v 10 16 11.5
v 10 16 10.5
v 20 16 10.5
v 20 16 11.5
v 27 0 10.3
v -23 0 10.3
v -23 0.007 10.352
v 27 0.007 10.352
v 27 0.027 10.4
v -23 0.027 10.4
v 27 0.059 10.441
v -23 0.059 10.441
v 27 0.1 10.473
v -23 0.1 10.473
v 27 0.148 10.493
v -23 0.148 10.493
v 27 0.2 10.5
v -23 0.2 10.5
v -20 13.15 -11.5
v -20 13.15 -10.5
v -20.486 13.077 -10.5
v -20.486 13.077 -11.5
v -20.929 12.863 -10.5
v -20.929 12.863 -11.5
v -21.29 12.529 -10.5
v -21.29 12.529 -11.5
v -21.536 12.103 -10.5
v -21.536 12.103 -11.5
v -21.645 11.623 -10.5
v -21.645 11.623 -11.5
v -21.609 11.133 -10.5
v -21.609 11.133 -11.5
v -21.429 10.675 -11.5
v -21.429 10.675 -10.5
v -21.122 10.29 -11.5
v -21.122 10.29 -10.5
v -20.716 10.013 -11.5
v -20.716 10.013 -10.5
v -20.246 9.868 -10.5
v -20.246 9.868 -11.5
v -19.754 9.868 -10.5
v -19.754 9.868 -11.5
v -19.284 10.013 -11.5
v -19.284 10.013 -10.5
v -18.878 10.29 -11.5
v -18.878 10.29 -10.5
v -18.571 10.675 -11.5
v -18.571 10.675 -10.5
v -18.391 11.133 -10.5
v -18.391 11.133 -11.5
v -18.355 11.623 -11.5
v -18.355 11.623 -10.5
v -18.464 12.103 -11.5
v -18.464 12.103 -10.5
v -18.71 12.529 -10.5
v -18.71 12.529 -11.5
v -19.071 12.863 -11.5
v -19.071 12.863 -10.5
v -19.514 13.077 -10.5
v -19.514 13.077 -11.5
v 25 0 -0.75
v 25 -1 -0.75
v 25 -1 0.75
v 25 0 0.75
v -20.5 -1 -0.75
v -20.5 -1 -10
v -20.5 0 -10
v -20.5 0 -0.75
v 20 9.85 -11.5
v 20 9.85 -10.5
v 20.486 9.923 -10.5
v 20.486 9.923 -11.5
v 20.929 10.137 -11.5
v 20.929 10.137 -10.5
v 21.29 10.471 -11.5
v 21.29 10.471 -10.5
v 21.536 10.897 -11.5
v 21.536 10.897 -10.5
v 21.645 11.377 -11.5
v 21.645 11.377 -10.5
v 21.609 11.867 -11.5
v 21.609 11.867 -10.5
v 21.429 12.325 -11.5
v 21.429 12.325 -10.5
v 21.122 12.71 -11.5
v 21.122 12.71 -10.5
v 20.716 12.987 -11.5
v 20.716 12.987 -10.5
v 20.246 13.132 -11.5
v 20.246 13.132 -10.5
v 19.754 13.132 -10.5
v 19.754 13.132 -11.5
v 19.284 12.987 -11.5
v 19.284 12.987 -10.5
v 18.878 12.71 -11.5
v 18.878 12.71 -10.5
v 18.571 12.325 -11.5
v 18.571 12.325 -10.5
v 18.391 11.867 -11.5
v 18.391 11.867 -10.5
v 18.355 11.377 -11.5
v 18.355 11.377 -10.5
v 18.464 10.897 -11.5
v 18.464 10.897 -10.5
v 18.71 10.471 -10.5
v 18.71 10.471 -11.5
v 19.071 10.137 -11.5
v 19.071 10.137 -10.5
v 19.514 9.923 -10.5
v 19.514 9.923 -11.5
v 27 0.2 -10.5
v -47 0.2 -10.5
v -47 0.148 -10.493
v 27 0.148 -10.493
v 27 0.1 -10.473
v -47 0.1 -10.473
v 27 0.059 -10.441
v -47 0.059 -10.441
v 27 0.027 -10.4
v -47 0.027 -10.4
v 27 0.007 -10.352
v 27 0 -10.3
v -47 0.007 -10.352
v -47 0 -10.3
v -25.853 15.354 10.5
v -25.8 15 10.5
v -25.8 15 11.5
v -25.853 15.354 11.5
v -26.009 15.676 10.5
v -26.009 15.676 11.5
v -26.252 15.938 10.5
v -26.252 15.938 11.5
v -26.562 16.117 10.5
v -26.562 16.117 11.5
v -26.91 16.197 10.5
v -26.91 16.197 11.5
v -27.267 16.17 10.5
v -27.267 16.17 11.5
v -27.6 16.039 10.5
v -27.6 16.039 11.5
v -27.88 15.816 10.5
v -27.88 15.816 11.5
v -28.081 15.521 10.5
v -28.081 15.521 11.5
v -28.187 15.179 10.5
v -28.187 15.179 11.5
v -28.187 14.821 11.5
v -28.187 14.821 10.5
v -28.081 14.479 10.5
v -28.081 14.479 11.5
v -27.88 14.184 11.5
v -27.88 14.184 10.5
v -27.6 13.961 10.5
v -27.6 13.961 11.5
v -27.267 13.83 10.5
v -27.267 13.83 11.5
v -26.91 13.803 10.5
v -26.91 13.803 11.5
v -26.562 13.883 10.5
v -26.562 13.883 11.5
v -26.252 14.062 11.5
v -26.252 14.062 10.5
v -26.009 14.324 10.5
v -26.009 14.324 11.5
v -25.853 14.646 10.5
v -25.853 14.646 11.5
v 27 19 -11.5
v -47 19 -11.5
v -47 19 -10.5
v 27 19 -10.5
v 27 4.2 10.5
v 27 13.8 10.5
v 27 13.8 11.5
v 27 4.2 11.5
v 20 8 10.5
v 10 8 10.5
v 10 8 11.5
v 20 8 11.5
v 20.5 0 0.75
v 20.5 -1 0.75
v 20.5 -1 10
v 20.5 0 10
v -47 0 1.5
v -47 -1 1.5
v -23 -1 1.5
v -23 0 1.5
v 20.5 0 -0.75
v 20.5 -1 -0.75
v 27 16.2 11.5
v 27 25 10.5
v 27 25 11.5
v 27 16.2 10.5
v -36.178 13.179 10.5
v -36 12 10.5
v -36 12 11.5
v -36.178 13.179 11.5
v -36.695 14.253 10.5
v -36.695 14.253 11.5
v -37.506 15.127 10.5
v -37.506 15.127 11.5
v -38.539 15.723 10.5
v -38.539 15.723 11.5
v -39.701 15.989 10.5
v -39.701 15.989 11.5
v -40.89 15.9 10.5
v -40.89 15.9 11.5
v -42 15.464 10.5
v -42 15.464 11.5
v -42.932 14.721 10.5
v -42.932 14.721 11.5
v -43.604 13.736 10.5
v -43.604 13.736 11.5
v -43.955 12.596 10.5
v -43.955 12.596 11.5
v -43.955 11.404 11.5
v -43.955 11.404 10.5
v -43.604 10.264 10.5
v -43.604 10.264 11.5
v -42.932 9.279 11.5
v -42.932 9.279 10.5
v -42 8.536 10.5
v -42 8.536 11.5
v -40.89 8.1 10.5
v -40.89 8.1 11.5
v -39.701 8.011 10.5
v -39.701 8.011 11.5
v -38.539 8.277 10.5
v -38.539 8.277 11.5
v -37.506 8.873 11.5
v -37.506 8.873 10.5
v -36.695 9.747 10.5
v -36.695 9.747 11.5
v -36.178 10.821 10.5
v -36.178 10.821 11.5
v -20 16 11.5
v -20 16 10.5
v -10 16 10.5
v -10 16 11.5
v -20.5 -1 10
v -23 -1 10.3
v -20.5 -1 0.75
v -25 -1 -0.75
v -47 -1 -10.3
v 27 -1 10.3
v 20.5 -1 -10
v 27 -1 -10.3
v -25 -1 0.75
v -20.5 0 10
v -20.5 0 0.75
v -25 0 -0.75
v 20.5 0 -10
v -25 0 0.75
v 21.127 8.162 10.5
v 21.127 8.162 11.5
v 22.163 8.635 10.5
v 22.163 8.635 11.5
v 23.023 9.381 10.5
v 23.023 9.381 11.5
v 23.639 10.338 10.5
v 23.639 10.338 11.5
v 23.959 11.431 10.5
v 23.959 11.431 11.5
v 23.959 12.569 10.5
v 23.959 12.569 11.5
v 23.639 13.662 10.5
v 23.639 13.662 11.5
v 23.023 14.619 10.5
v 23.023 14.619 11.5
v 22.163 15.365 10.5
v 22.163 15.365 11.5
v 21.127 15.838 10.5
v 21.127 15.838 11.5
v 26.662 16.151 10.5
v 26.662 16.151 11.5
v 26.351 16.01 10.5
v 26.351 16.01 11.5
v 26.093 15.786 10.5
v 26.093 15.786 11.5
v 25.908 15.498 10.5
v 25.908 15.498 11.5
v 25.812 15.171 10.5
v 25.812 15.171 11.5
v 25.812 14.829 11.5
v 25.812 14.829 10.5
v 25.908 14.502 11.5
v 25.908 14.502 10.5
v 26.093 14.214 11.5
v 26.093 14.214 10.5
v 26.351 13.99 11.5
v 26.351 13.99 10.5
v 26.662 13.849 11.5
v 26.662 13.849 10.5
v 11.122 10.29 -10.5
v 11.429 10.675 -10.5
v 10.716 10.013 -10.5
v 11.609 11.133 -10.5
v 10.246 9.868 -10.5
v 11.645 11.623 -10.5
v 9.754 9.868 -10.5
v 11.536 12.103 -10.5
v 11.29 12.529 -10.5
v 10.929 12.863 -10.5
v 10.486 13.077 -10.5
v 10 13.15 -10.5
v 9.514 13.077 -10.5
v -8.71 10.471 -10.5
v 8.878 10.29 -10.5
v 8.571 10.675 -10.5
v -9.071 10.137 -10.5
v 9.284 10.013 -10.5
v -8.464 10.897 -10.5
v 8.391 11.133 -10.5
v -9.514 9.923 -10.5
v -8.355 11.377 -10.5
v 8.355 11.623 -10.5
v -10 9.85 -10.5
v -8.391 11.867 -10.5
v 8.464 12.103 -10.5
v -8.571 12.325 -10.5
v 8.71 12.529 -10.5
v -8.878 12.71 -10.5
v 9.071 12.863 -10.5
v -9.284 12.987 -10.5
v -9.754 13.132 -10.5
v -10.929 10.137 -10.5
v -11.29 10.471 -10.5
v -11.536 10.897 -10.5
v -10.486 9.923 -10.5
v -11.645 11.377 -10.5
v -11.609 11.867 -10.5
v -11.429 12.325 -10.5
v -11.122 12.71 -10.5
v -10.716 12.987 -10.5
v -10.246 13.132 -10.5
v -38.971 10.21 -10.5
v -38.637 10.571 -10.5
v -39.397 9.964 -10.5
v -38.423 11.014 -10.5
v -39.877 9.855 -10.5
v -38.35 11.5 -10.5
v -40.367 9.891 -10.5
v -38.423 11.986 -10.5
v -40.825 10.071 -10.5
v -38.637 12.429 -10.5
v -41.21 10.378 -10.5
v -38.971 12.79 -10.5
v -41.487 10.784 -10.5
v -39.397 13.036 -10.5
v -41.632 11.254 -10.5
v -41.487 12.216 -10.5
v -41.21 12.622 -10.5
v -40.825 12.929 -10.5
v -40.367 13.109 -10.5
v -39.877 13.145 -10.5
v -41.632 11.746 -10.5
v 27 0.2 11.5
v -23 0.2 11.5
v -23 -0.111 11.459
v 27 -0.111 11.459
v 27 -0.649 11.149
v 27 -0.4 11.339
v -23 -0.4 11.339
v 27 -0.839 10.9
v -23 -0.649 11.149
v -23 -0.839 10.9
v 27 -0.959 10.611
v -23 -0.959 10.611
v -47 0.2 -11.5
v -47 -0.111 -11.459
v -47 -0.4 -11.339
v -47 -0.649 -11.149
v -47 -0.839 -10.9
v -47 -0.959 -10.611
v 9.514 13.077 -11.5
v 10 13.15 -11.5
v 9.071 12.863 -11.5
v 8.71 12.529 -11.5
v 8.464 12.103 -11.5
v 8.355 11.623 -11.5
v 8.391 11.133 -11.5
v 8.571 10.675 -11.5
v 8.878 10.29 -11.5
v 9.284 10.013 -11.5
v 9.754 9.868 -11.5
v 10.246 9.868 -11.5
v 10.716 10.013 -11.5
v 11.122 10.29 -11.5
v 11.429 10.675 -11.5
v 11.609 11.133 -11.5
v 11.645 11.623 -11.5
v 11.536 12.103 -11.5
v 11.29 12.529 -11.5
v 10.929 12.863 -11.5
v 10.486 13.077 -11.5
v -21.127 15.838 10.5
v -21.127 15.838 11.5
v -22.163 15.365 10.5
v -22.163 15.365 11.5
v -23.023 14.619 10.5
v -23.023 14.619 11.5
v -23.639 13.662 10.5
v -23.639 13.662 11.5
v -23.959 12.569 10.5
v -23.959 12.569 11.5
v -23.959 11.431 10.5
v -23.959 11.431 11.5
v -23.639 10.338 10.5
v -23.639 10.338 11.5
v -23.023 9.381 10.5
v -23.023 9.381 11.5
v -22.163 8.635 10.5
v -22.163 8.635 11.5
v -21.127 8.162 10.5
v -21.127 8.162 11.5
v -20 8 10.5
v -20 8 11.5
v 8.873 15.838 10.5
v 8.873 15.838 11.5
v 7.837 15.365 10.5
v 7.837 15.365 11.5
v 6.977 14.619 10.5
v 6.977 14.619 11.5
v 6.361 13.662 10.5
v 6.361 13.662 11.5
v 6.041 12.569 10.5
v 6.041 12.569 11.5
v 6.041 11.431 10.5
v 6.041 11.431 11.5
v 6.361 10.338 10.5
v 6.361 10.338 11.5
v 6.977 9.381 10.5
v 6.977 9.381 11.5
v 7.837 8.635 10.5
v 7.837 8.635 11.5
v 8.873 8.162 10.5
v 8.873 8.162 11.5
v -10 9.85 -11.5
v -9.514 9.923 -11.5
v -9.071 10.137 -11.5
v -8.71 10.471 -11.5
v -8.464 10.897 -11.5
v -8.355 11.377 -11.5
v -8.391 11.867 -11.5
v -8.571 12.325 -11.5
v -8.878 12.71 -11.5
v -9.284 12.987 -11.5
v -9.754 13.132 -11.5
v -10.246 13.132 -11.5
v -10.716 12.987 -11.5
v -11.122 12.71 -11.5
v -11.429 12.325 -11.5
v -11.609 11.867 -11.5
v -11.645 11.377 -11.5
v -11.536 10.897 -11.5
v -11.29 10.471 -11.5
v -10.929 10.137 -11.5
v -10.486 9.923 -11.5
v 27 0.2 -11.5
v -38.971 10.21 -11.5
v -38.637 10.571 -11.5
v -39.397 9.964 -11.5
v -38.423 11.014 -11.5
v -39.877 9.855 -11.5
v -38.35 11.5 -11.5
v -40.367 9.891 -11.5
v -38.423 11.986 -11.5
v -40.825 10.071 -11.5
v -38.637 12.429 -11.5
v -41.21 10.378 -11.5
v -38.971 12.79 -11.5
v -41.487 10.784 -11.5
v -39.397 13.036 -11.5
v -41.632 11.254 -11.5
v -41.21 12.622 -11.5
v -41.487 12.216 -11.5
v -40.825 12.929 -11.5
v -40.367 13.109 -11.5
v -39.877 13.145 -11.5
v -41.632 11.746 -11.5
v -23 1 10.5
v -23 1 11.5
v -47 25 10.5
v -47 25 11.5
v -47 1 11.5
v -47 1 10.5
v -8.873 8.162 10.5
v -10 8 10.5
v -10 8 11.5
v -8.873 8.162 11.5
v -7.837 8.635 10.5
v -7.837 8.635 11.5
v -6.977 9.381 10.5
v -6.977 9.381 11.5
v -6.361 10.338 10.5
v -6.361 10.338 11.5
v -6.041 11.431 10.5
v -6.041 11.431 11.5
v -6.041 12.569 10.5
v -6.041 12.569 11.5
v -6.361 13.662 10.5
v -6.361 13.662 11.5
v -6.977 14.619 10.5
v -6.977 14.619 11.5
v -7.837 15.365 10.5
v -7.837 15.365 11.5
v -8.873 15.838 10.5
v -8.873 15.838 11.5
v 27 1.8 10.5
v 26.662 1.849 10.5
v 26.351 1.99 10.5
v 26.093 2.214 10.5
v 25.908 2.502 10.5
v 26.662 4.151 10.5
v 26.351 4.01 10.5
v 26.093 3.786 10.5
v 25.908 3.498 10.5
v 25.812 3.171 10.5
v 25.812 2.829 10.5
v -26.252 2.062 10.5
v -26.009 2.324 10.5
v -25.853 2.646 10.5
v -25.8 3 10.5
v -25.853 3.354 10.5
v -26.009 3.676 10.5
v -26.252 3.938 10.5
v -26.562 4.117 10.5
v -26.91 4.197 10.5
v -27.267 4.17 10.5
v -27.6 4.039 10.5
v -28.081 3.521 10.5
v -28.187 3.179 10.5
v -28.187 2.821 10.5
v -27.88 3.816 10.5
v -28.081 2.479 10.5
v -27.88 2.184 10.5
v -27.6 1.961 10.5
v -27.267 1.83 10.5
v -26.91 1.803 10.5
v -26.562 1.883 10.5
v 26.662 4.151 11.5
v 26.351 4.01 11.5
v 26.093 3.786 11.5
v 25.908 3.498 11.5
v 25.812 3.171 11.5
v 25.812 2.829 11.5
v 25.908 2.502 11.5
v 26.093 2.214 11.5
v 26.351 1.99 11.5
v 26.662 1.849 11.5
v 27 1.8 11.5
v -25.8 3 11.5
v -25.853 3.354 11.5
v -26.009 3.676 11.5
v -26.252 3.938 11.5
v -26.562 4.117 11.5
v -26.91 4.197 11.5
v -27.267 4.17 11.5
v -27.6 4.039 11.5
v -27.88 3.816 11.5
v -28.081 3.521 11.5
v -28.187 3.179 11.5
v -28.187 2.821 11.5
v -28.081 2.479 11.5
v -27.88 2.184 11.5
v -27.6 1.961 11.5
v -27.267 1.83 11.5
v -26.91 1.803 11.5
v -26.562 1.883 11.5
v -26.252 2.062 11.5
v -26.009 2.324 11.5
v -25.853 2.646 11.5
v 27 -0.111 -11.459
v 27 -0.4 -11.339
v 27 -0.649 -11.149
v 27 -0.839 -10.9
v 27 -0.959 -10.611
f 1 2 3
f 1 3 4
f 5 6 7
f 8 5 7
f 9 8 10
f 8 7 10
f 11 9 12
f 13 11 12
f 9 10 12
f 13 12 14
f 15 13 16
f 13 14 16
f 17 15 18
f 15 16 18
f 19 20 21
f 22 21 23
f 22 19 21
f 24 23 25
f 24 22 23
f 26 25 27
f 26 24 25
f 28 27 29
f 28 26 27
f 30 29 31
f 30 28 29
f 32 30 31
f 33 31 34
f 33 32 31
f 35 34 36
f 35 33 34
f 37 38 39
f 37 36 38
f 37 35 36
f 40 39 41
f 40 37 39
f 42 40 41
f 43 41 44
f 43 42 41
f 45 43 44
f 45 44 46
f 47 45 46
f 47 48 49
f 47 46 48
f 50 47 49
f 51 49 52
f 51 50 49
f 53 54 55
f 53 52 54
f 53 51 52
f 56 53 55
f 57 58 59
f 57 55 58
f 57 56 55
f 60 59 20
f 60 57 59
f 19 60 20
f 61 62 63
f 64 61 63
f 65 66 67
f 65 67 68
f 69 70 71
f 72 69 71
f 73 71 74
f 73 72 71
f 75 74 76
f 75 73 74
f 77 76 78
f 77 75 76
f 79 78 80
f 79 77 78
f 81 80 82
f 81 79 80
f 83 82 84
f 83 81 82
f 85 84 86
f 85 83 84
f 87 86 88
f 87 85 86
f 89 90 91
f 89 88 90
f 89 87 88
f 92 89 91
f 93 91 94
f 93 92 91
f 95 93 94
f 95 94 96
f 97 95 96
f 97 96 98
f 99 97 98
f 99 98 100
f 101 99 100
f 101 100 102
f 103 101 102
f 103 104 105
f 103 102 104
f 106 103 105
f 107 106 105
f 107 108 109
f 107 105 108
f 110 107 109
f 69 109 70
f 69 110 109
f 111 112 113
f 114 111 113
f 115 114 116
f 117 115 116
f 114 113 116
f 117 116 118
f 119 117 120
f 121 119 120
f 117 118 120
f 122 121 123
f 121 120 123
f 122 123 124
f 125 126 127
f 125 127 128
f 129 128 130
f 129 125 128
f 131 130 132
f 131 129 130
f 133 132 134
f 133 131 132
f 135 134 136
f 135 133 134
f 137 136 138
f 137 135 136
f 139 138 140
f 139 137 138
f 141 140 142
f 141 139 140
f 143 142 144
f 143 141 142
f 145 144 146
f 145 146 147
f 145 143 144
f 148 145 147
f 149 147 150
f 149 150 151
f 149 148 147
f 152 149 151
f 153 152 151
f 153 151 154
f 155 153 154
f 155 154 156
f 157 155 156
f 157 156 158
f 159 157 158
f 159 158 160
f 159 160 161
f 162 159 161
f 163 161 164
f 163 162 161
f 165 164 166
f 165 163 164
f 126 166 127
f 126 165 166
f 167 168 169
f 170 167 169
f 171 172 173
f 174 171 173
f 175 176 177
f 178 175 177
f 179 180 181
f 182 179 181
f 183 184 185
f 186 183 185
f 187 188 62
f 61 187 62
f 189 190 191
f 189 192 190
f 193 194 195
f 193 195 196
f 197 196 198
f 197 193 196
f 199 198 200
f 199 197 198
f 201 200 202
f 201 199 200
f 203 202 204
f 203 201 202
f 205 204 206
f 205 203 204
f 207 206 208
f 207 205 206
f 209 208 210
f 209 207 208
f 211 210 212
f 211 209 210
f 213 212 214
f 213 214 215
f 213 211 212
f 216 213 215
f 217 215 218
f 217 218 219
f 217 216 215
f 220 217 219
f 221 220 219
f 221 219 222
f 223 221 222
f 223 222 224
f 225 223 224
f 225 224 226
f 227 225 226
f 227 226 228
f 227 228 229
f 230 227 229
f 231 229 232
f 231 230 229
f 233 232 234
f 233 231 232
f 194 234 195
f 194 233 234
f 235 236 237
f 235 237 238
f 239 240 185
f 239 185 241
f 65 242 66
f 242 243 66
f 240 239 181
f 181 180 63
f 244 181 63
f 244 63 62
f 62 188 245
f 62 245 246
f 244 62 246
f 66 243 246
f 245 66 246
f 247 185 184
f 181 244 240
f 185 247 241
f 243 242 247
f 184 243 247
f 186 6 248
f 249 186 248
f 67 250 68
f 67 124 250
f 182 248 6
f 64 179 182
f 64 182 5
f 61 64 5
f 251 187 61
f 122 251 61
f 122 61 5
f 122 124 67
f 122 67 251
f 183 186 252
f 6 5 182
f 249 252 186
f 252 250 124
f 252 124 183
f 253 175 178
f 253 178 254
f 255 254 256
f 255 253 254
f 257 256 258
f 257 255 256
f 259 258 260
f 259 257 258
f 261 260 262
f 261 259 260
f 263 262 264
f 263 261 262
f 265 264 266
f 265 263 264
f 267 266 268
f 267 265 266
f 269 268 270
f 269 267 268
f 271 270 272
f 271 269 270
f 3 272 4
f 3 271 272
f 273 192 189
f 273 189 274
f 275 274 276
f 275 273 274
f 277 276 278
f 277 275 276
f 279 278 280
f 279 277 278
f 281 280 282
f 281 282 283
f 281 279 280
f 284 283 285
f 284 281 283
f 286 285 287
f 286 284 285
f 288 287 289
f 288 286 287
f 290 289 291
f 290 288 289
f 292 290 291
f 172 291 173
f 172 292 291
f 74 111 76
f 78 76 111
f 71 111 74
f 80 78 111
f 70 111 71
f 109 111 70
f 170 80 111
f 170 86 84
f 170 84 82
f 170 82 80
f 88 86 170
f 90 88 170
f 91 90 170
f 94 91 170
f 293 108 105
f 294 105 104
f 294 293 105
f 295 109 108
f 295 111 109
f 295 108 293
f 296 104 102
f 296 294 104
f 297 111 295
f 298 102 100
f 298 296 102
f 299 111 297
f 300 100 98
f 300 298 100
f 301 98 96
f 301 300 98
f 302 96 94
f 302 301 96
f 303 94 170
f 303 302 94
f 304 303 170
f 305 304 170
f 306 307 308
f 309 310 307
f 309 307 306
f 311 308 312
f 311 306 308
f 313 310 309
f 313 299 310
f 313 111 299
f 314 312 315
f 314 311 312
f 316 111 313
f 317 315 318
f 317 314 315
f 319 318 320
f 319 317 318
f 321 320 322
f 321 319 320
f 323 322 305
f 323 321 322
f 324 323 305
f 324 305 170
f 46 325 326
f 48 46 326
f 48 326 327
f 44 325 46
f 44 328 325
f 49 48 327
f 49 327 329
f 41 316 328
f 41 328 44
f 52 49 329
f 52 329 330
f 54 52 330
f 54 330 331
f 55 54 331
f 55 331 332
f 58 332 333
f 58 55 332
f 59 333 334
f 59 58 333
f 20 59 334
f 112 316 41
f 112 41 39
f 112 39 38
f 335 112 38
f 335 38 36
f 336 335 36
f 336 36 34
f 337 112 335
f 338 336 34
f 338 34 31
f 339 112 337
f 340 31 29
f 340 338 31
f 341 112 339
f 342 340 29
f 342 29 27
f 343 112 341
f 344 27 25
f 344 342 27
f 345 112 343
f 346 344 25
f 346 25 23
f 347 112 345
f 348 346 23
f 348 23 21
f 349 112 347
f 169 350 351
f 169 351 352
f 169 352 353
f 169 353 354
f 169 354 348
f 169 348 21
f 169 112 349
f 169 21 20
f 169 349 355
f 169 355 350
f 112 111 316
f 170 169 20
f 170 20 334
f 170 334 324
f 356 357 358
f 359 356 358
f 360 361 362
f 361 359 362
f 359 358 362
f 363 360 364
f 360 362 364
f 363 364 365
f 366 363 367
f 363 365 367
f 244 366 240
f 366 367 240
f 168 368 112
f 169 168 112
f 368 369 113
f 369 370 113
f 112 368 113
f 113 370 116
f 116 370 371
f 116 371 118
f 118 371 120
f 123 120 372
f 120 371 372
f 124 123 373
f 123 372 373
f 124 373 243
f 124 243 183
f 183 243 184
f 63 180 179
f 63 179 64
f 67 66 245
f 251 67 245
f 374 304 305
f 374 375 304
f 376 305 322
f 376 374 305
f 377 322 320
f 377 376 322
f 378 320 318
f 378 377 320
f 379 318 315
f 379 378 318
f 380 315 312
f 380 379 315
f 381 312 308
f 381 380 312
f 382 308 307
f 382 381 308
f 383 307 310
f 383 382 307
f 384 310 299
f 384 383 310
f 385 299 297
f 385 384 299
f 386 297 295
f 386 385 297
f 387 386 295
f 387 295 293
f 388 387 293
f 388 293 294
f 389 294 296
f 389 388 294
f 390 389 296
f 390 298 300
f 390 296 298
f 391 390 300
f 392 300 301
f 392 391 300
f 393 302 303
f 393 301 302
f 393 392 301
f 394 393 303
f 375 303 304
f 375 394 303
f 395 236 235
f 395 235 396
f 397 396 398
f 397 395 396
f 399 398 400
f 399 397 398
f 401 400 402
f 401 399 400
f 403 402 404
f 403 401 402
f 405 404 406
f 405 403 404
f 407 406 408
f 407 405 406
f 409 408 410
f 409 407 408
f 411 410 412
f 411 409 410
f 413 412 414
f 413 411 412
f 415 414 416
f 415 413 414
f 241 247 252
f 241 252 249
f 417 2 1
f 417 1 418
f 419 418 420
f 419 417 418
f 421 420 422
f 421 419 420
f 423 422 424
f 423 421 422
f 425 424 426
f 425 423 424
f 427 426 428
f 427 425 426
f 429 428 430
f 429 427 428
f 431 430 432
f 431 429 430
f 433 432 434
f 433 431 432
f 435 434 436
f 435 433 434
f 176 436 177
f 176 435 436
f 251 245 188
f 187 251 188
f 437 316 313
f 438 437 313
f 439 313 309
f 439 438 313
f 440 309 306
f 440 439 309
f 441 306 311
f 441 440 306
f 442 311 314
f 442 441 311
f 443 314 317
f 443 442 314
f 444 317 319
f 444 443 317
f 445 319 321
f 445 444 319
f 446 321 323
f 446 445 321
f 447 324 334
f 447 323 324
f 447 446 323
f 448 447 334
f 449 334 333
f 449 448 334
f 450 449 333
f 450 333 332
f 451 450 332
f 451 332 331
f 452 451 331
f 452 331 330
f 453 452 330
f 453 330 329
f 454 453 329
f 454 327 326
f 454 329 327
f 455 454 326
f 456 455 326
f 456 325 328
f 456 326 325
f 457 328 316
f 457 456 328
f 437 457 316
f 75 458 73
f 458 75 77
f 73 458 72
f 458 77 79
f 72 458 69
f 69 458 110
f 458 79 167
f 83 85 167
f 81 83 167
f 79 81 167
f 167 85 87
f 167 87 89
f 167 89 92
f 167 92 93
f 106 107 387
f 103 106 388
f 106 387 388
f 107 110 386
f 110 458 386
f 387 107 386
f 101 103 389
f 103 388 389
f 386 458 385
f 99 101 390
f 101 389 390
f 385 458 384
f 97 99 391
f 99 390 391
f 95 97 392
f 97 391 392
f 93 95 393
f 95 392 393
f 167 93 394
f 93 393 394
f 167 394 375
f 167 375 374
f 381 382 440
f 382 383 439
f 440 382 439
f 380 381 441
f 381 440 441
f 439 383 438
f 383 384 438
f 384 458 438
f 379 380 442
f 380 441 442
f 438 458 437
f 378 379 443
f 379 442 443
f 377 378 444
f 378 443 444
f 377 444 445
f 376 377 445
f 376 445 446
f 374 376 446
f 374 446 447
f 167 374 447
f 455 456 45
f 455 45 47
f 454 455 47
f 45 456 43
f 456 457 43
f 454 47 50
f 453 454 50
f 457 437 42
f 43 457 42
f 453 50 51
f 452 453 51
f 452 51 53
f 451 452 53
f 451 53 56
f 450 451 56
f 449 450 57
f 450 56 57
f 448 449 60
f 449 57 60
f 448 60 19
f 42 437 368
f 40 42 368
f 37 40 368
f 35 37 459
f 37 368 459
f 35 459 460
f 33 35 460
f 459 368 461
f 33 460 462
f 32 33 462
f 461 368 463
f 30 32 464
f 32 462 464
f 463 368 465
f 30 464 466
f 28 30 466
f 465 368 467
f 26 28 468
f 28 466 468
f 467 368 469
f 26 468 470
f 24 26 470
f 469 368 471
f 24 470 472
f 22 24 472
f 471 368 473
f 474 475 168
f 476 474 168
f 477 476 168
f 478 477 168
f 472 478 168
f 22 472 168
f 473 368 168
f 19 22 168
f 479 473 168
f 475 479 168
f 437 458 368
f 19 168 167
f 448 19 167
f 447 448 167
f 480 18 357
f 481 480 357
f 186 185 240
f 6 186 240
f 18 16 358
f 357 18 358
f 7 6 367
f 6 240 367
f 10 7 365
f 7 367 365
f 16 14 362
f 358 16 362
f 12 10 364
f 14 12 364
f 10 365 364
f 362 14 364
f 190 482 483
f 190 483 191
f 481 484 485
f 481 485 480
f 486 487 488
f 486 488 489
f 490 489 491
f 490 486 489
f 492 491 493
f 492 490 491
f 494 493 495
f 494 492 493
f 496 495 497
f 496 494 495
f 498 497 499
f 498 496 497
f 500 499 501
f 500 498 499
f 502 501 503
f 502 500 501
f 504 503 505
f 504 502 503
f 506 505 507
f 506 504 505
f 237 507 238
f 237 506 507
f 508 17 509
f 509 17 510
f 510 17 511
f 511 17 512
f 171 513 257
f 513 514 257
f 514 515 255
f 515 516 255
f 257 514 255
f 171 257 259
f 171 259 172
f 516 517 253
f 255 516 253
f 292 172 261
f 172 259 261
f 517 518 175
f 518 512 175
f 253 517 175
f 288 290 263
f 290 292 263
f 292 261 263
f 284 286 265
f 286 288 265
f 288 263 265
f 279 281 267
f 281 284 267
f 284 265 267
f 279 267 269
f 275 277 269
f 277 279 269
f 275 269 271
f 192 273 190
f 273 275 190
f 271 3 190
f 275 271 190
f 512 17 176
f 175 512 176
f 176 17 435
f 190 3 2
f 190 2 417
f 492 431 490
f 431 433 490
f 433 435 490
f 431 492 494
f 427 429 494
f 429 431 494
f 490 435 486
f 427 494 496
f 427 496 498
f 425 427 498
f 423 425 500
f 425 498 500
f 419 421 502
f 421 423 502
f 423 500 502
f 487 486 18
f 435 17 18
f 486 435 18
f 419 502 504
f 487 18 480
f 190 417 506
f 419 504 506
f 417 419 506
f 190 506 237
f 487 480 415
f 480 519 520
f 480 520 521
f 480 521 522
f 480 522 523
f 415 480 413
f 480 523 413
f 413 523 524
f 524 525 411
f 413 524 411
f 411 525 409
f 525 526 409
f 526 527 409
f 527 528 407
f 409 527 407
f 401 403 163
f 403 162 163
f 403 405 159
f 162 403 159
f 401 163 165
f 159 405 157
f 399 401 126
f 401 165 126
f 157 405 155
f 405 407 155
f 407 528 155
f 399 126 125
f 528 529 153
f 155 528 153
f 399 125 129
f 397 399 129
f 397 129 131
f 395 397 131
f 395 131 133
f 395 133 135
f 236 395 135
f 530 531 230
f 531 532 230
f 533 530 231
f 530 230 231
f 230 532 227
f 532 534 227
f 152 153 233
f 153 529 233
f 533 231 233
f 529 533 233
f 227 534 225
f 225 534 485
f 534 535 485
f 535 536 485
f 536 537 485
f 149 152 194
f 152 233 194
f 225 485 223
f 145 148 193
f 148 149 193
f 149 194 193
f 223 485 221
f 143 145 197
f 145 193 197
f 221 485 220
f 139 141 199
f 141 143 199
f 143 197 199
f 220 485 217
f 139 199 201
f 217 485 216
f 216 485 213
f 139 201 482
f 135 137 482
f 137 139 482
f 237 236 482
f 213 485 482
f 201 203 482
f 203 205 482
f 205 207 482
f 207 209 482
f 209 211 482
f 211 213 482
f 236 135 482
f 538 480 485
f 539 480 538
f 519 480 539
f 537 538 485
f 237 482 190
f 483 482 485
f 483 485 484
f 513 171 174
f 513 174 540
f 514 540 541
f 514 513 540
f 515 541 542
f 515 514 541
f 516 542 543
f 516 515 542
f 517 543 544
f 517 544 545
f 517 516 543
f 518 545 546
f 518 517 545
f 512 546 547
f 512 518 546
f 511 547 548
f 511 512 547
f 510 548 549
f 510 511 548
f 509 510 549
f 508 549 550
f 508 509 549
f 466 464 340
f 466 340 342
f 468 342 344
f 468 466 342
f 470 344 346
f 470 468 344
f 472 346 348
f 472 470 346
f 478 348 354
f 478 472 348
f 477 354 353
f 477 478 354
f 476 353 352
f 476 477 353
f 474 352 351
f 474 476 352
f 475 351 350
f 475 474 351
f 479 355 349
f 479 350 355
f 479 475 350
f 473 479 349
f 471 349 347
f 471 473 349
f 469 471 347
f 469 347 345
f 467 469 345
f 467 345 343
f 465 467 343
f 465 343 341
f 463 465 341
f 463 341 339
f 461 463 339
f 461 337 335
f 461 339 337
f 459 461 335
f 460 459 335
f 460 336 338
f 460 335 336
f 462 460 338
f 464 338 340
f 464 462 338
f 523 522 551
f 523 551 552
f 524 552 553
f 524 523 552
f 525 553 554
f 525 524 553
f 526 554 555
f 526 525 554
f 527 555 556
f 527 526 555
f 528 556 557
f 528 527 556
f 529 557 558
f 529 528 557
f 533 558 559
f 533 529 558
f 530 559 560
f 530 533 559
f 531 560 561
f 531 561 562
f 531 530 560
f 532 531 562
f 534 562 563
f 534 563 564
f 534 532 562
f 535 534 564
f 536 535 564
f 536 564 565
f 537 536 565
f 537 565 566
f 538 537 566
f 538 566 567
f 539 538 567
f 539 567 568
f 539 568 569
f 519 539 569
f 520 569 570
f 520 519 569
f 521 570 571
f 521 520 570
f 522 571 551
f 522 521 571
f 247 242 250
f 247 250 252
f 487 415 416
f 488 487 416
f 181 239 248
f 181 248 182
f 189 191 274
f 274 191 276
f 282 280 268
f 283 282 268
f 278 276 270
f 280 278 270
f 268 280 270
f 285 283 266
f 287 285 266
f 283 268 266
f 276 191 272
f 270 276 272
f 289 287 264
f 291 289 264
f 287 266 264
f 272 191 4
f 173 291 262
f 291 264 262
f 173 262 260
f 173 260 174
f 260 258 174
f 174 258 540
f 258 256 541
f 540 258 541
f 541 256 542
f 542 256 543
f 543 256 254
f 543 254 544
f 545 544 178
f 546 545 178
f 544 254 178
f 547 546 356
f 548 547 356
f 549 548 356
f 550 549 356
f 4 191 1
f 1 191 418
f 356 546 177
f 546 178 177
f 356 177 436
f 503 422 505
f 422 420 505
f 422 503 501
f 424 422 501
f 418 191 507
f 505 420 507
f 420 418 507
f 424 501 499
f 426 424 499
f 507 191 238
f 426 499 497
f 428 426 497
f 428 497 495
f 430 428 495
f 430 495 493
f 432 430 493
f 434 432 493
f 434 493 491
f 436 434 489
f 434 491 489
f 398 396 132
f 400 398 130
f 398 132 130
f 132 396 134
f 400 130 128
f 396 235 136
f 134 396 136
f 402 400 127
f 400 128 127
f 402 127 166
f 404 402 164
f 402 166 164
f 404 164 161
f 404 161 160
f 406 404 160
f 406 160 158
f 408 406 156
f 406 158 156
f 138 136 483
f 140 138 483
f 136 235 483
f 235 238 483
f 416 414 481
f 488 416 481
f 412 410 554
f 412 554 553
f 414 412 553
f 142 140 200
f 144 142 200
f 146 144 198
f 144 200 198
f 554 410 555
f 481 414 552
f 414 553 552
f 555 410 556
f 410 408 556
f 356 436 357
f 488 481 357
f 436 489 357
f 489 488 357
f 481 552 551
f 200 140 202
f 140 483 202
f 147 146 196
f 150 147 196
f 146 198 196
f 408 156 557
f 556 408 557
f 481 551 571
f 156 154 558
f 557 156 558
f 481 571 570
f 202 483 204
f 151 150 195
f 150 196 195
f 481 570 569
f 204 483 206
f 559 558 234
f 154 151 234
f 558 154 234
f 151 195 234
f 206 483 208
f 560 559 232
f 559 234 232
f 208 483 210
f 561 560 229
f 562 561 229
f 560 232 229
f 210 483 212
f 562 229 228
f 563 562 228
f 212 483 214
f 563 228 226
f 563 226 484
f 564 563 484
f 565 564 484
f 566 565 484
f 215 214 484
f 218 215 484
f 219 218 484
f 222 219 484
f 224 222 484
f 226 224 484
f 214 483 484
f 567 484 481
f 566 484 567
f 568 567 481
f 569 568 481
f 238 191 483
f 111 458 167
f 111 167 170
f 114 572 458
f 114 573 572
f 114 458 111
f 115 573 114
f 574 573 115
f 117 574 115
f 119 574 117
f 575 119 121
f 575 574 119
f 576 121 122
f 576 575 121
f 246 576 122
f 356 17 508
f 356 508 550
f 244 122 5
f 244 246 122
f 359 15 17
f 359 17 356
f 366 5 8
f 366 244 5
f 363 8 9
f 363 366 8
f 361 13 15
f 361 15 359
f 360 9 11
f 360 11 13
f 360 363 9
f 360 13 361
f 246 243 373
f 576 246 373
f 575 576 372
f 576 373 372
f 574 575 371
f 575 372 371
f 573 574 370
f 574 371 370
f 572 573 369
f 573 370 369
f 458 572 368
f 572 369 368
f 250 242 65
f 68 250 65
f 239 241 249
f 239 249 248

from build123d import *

# Parameters (mm, degrees)
FESTPLATTENBLECH_SCHNITT_LINEAR_START        = -14.177516002
FESTPLATTENBLECH_SCHNITT_LINEAR_AU_2_W       = 115
FESTPLATTENBLECH_SCHNITT_LINEAR_AU_2_H       = 1
FESTPLATTENBLECH_SCHNITT_LINEAR_AUSTRA_DEPTH = 20.6
FESTPLATTENBLECH_SCHNITT_LINEAR_START_2      = 6.622483998
FESTPLATTENBLECH_SCHNITT_LINEAR_AU_3_O_W     = 115
FESTPLATTENBLECH_SCHNITT_LINEAR_AU_3_O_H     = 6
FESTPLATTENBLECH_SCHNITT_LINEAR_AU_3_DEPTH   = 1
FESTPLATTENBLECH_SCHNITT_LINEAR_START_3      = -15.377516002
FESTPLATTENBLECH_SCHNITT_LINEAR_AU_4_O_R     = 4
FESTPLATTENBLECH_SCHNITT_LINEAR_AU_4_O_R_2   = 1.65
FESTPLATTENBLECH_SCHNITT_LINEAR_AU_4_O_R_3   = 1.2
FESTPLATTENBLECH_SCHNITT_LINEAR_AU_4_DEPTH   = 1
FESTPLATTENBLECH_SCHNITT_LINEAR_START_4      = -59.8
FESTPLATTENBLECH_SCHNITT_LINEAR_AU_5_O_W     = 3
FESTPLATTENBLECH_SCHNITT_LINEAR_AU_5_O_H     = 1
FESTPLATTENBLECH_SCHNITT_LINEAR_AU_5_DEPTH   = 115
FESTPLATTENBLECH_SCHNITT_LINEAR_AU_6_O_W     = 8
FESTPLATTENBLECH_SCHNITT_LINEAR_AU_6_O_H     = 1
FESTPLATTENBLECH_SCHNITT_LINEAR_AU_6_DEPTH   = 37.5
FESTPLATTENBLECH_SCHNITT_LINEAR_START_5      = 17.7
FESTPLATTENBLECH_SCHNITT_LINEAR_AU_7_O_W     = 8
FESTPLATTENBLECH_SCHNITT_LINEAR_AU_7_O_H     = 1
FESTPLATTENBLECH_SCHNITT_LINEAR_AU_7_DEPTH   = 37.5
FESTPLATTENBLECH_SCHNITT_LINEAR_START_6      = -12.3
FESTPLATTENBLECH_SCHNITT_LINEAR_AU_8_O_W     = 8
FESTPLATTENBLECH_SCHNITT_LINEAR_AU_8_O_H     = 1
FESTPLATTENBLECH_SCHNITT_LINEAR_AU_8_DEPTH   = 20
FESTPLATTENBLECH_SCHNITT_LINEAR_AU_9_O_R     = 4
FESTPLATTENBLECH_SCHNITT_LINEAR_AU_9_O_R_2   = 1.2
FESTPLATTENBLECH_SCHNITT_LINEAR_AU_9_DEPTH   = 1
FESTPLATTENBLECH_SCHNITT_LINEAR_START_7      = -16
FESTPLATTENBLECH_SCHNITT_LINEAR_AU_11_R      = 1.65
FESTPLATTENBLECH_SCHNITT_LINEAR_AU_10_DEPTH  = 22.622483998
SKIZZE1_W                                    = 41
SKIZZE1_H                                    = 20
SCHNITT_LINEAR_AUSTRAGEN1_DEPTH              = 65.144368423
SKIZZE2_W                                    = 50
SKIZZE2_H                                    = 1.5
SCHNITT_LINEAR_AUSTRAGEN2_DEPTH              = 65.144368423
SKIZZE3_OUTSIDE_W                            = 141.024
SKIZZE3_OUTSIDE_H                            = 49.024
SKIZZE3_OUTSIDE_W_2                          = 74
SKIZZE3_OUTSIDE_H_2                          = 23
SCHNITT_LINEAR_AUSTRAGEN3_DEPTH              = 65.144368423
SKIZZE9_W                                    = 24
SKIZZE9_H                                    = 10
SCHNITT_LINEAR_AUSTRAGEN5_DEPTH              = 2


with BuildPart() as part:
    # <Festplattenblech>-<Schnitt-Linear austragen2>: read off the stored shape, not the designer's step
    # Festplattenblech_-_Schnitt-Linear au 2 → <Festplattenblech>-<Schnitt-Linear austragen2> (new body)
    with BuildSketch(Plane.XY.offset(FESTPLATTENBLECH_SCHNITT_LINEAR_START)):
        with Locations((-2.3, 1.027254306)):
            Rectangle(FESTPLATTENBLECH_SCHNITT_LINEAR_AU_2_W, FESTPLATTENBLECH_SCHNITT_LINEAR_AU_2_H)
    extrude(amount=FESTPLATTENBLECH_SCHNITT_LINEAR_AUSTRA_DEPTH)



with BuildPart() as body_2:
    # Festplattenblech_-_Schnitt-Linear au 3 o → Festplattenblech_-_Schnitt-Linear au 3 (new body)
    with BuildSketch(Plane.XY.offset(FESTPLATTENBLECH_SCHNITT_LINEAR_START_2)):
        with Locations((-2.3, 23.527254306)):
            Rectangle(FESTPLATTENBLECH_SCHNITT_LINEAR_AU_3_O_W, FESTPLATTENBLECH_SCHNITT_LINEAR_AU_3_O_H)
    extrude(amount=FESTPLATTENBLECH_SCHNITT_LINEAR_AU_3_DEPTH)


with BuildPart() as body_3:
    # Festplattenblech_-_Schnitt-Linear au 4 o → Festplattenblech_-_Schnitt-Linear au 4 (new body)
    # profile 1 of 12: a face of its own
    with BuildSketch(Plane.XY.offset(FESTPLATTENBLECH_SCHNITT_LINEAR_START_3)):
        with Locations((-42.3, 13.527254306)):
            Circle(FESTPLATTENBLECH_SCHNITT_LINEAR_AU_4_O_R)
        with Locations((-42.3, 13.027254306)):
            Circle(FESTPLATTENBLECH_SCHNITT_LINEAR_AU_4_O_R_2, mode=Mode.SUBTRACT)
    # profile 2 of 12: a face of its own
    with BuildSketch(Plane.XY.offset(FESTPLATTENBLECH_SCHNITT_LINEAR_START_3)):
        with BuildLine():
            ThreePointArc((-22.3, 17.527254306), (-26.3, 13.527254306), (-22.3, 9.527254306))
            Line((-22.3, 9.527254306), (-12.3, 9.527254306))
            ThreePointArc((-12.3, 9.527254306), (-8.3, 13.527254306), (-12.3, 17.527254306))
            Line((-12.3, 17.527254306), (-22.3, 17.527254306))
        make_face()
        with Locations((-22.3, 13.027254306)):
            Circle(FESTPLATTENBLECH_SCHNITT_LINEAR_AU_4_O_R_2, mode=Mode.SUBTRACT)
        with Locations((-12.3, 13.027254306)):
            Circle(FESTPLATTENBLECH_SCHNITT_LINEAR_AU_4_O_R_2, mode=Mode.SUBTRACT)
    # profile 3 of 12: a face of its own
    with BuildSketch(Plane.XY.offset(FESTPLATTENBLECH_SCHNITT_LINEAR_START_3)):
        with Locations((-55.3, 16.527254306)):
            Circle(FESTPLATTENBLECH_SCHNITT_LINEAR_AU_4_O_R_3)
    # profile 4 of 12: a face of its own
    with BuildSketch(Plane.XY.offset(FESTPLATTENBLECH_SCHNITT_LINEAR_START_3)):
        with Locations((-55.3, 4.527254306)):
            Circle(FESTPLATTENBLECH_SCHNITT_LINEAR_AU_4_O_R_3)
    # profile 5 of 12: a face of its own
    with BuildSketch(Plane.XY.offset(FESTPLATTENBLECH_SCHNITT_LINEAR_START_3)):
        with Locations((-29.3, 16.527254306)):
            Circle(FESTPLATTENBLECH_SCHNITT_LINEAR_AU_4_O_R_3)
    # profile 6 of 12: a face of its own
    with BuildSketch(Plane.XY.offset(FESTPLATTENBLECH_SCHNITT_LINEAR_START_3)):
        with Locations((-29.3, 4.527254306)):
            Circle(FESTPLATTENBLECH_SCHNITT_LINEAR_AU_4_O_R_3)
    # profile 7 of 12: a face of its own
    with BuildSketch(Plane.XY.offset(FESTPLATTENBLECH_SCHNITT_LINEAR_START_3)):
        with Locations((50.7, 4.527254306)):
            Circle(FESTPLATTENBLECH_SCHNITT_LINEAR_AU_4_O_R_3)
    # profile 8 of 12: a face of its own
    with BuildSketch(Plane.XY.offset(FESTPLATTENBLECH_SCHNITT_LINEAR_START_3)):
        with BuildLine():
            ThreePointArc((17.7, 9.527254306), (21.7, 13.527254306), (17.7, 17.527254306))
            Line((17.7, 17.527254306), (7.7, 17.527254306))
            ThreePointArc((7.7, 17.527254306), (3.7, 13.527254306), (7.7, 9.527254306))
            Line((7.7, 9.527254306), (17.7, 9.527254306))
        make_face()
        with Locations((7.7, 13.027254306)):
            Circle(FESTPLATTENBLECH_SCHNITT_LINEAR_AU_4_O_R_2, mode=Mode.SUBTRACT)
        with Locations((17.7, 13.027254306)):
            Circle(FESTPLATTENBLECH_SCHNITT_LINEAR_AU_4_O_R_2, mode=Mode.SUBTRACT)
    # profile 9 of 12: a face of its own
    with BuildSketch(Plane.XY.offset(FESTPLATTENBLECH_SCHNITT_LINEAR_START_3)):
        with Locations((24.7, 4.527254306)):
            Circle(FESTPLATTENBLECH_SCHNITT_LINEAR_AU_4_O_R_3)
    # profile 10 of 12: a face of its own
    with BuildSketch(Plane.XY.offset(FESTPLATTENBLECH_SCHNITT_LINEAR_START_3)):
        with Locations((24.7, 16.527254306)):
            Circle(FESTPLATTENBLECH_SCHNITT_LINEAR_AU_4_O_R_3)
    # profile 11 of 12: a face of its own
    with BuildSketch(Plane.XY.offset(FESTPLATTENBLECH_SCHNITT_LINEAR_START_3)):
        with Locations((37.7, 13.527254306)):
            Circle(FESTPLATTENBLECH_SCHNITT_LINEAR_AU_4_O_R)
        with Locations((37.7, 13.027254306)):
            Circle(FESTPLATTENBLECH_SCHNITT_LINEAR_AU_4_O_R_2, mode=Mode.SUBTRACT)
    # profile 12 of 12: a face of its own
    with BuildSketch(Plane.XY.offset(FESTPLATTENBLECH_SCHNITT_LINEAR_START_3)):
        with Locations((50.7, 16.527254306)):
            Circle(FESTPLATTENBLECH_SCHNITT_LINEAR_AU_4_O_R_3)
    extrude(amount=FESTPLATTENBLECH_SCHNITT_LINEAR_AU_4_DEPTH)


with BuildPart() as part_1:
    add(part.part)

    add(body_2.part)  # Festplattenblech_-_Schnitt-Linear au 5 merges body 2

    add(body_3.part)  # Festplattenblech_-_Schnitt-Linear au 5 merges body 3
    # Festplattenblech_-_Schnitt-Linear au 5 o → Festplattenblech_-_Schnitt-Linear au 5 (add)
    with BuildSketch(Plane.YZ.offset(FESTPLATTENBLECH_SCHNITT_LINEAR_START_4)):
        with Locations((19.027254306, -14.877516002)):
            Rectangle(FESTPLATTENBLECH_SCHNITT_LINEAR_AU_5_O_W, FESTPLATTENBLECH_SCHNITT_LINEAR_AU_5_O_H)
        with BuildLine():
            Line((1.727254306, -15.377516002), (9.527254306, -15.377516002))
            Line((9.527254306, -15.377516002), (9.527254306, -14.377516002))
            Line((9.527254306, -14.377516002), (1.727254306, -14.377516002))
            ThreePointArc((1.727254306, -14.377516002), (1.58583295, -14.318937358), (1.527254306, -14.177516002))
            Line((1.527254306, -14.177516002), (0.527254306, -14.177516002))
            ThreePointArc((0.527254306, -14.177516002), (0.878726169, -15.026044139), (1.727254306, -15.377516002))
        make_face()
        with BuildLine():
            Line((0.527254306, 6.422483998), (1.527254306, 6.422483998))
            ThreePointArc((1.527254306, 6.422483998), (1.58583295, 6.563905354), (1.727254306, 6.622483998))
            Line((1.727254306, 6.622483998), (9.527254306, 6.622483998))
            Line((9.527254306, 6.622483998), (9.527254306, 7.622483998))
            Line((9.527254306, 7.622483998), (1.727254306, 7.622483998))
            ThreePointArc((1.727254306, 7.622483998), (0.878726169, 7.271012135), (0.527254306, 6.422483998))
        make_face()
        with Locations((19.027254306, 7.122483998)):
            Rectangle(FESTPLATTENBLECH_SCHNITT_LINEAR_AU_5_O_W, FESTPLATTENBLECH_SCHNITT_LINEAR_AU_5_O_H)
    extrude(amount=FESTPLATTENBLECH_SCHNITT_LINEAR_AU_5_DEPTH)

    # Festplattenblech_-_Schnitt-Linear au 6 o → Festplattenblech_-_Schnitt-Linear au 6 (add)
    with BuildSketch(Plane.YZ.offset(FESTPLATTENBLECH_SCHNITT_LINEAR_START_4)):
        with Locations((13.527254306, -14.877516002)):
            Rectangle(FESTPLATTENBLECH_SCHNITT_LINEAR_AU_6_O_W, FESTPLATTENBLECH_SCHNITT_LINEAR_AU_6_O_H)
        with Locations((13.527254306, 7.122483998)):
            Rectangle(FESTPLATTENBLECH_SCHNITT_LINEAR_AU_6_O_W, FESTPLATTENBLECH_SCHNITT_LINEAR_AU_6_O_H)
    extrude(amount=FESTPLATTENBLECH_SCHNITT_LINEAR_AU_6_DEPTH)

    # Festplattenblech_-_Schnitt-Linear au 7 o → Festplattenblech_-_Schnitt-Linear au 7 (add)
    with BuildSketch(Plane.YZ.offset(FESTPLATTENBLECH_SCHNITT_LINEAR_START_5)):
        with Locations((13.527254306, -14.877516002)):
            Rectangle(FESTPLATTENBLECH_SCHNITT_LINEAR_AU_7_O_W, FESTPLATTENBLECH_SCHNITT_LINEAR_AU_7_O_H)
        with Locations((13.527254306, 7.122483998)):
            Rectangle(FESTPLATTENBLECH_SCHNITT_LINEAR_AU_7_O_W, FESTPLATTENBLECH_SCHNITT_LINEAR_AU_7_O_H)
    extrude(amount=FESTPLATTENBLECH_SCHNITT_LINEAR_AU_7_DEPTH)

    # Festplattenblech_-_Schnitt-Linear au 8 o → Festplattenblech_-_Schnitt-Linear au 8 (add)
    with BuildSketch(Plane.YZ.offset(FESTPLATTENBLECH_SCHNITT_LINEAR_START_6)):
        with Locations((13.527254306, -14.877516002)):
            Rectangle(FESTPLATTENBLECH_SCHNITT_LINEAR_AU_8_O_W, FESTPLATTENBLECH_SCHNITT_LINEAR_AU_8_O_H)
        with Locations((13.527254306, 7.122483998)):
            Rectangle(FESTPLATTENBLECH_SCHNITT_LINEAR_AU_8_O_W, FESTPLATTENBLECH_SCHNITT_LINEAR_AU_8_O_H)
    extrude(amount=FESTPLATTENBLECH_SCHNITT_LINEAR_AU_8_DEPTH)

    # Festplattenblech_-_Schnitt-Linear au 9 o → Festplattenblech_-_Schnitt-Linear au 9 (cut)
    with BuildSketch(Plane.XY.offset(FESTPLATTENBLECH_SCHNITT_LINEAR_START_2)):
        with Locations((-42.3, 13.527254306)):
            Circle(FESTPLATTENBLECH_SCHNITT_LINEAR_AU_9_O_R)
        with BuildLine():
            ThreePointArc((-12.3, 9.527254306), (-8.3, 13.527254306), (-12.3, 17.527254306))
            Line((-12.3, 17.527254306), (-12.3, 9.527254306))
        make_face()
        with BuildLine():
            ThreePointArc((-22.3, 17.527254306), (-26.3, 13.527254306), (-22.3, 9.527254306))
            Line((-22.3, 9.527254306), (-22.3, 17.527254306))
        make_face()
        with Locations((-55.3, 16.527254306)):
            Circle(FESTPLATTENBLECH_SCHNITT_LINEAR_AU_9_O_R_2)
        with Locations((-55.3, 4.527254306)):
            Circle(FESTPLATTENBLECH_SCHNITT_LINEAR_AU_9_O_R_2)
        with Locations((-29.3, 16.527254306)):
            Circle(FESTPLATTENBLECH_SCHNITT_LINEAR_AU_9_O_R_2)
        with Locations((-29.3, 4.527254306)):
            Circle(FESTPLATTENBLECH_SCHNITT_LINEAR_AU_9_O_R_2)
        with Locations((50.7, 4.527254306)):
            Circle(FESTPLATTENBLECH_SCHNITT_LINEAR_AU_9_O_R_2)
        with BuildLine():
            ThreePointArc((7.7, 17.527254306), (3.7, 13.527254306), (7.7, 9.527254306))
            Line((7.7, 9.527254306), (7.7, 17.527254306))
        make_face()
        with BuildLine():
            ThreePointArc((17.7, 9.527254306), (21.7, 13.527254306), (17.7, 17.527254306))
            Line((17.7, 17.527254306), (17.7, 9.527254306))
        make_face()
        with Locations((24.7, 4.527254306)):
            Circle(FESTPLATTENBLECH_SCHNITT_LINEAR_AU_9_O_R_2)
        with Locations((24.7, 16.527254306)):
            Circle(FESTPLATTENBLECH_SCHNITT_LINEAR_AU_9_O_R_2)
        with Locations((37.7, 13.527254306)):
            Circle(FESTPLATTENBLECH_SCHNITT_LINEAR_AU_9_O_R)
        with Locations((50.7, 16.527254306)):
            Circle(FESTPLATTENBLECH_SCHNITT_LINEAR_AU_9_O_R_2)
    extrude(amount=FESTPLATTENBLECH_SCHNITT_LINEAR_AU_9_DEPTH, mode=Mode.SUBTRACT)

    # Festplattenblech_-_Schnitt-Linear au 11 → Festplattenblech_-_Schnitt-Linear au 10 (cut)
    with BuildSketch(Plane.XY.offset(FESTPLATTENBLECH_SCHNITT_LINEAR_START_7)):
        with BuildLine():
            Line((-12.3, 14.677254306), (-12.3, 11.377254306))
            ThreePointArc((-12.3, 11.377254306), (-10.65, 13.027254306), (-12.3, 14.677254306))
        make_face()
        with BuildLine():
            Line((-22.3, 11.377254306), (-22.3, 14.677254306))
            ThreePointArc((-22.3, 14.677254306), (-23.95, 13.027254306), (-22.3, 11.377254306))
        make_face()
        with BuildLine():
            Line((7.7, 11.377254306), (7.7, 14.677254306))
            ThreePointArc((7.7, 14.677254306), (6.05, 13.027254306), (7.7, 11.377254306))
        make_face()
        with BuildLine():
            Line((17.7, 14.677254306), (17.7, 11.377254306))
            ThreePointArc((17.7, 11.377254306), (19.35, 13.027254306), (17.7, 14.677254306))
        make_face()
        with Locations((37.7, 13.027254306)):
            Circle(FESTPLATTENBLECH_SCHNITT_LINEAR_AU_11_R)
        with Locations((-42.3, 13.027254306)):
            Circle(FESTPLATTENBLECH_SCHNITT_LINEAR_AU_11_R)
    extrude(amount=FESTPLATTENBLECH_SCHNITT_LINEAR_AU_10_DEPTH, mode=Mode.SUBTRACT)


with BuildPart() as part_2:
    # Festplattenblech: read off the stored shape, not the designer's step
    # Festplattenblech: moved
    add(part_1.part.moved(Location((2.3, -1.5272543, 3.877516))))

    # Skizze1 → Schnitt-Linear austragen1 (cut, through all)
    with BuildSketch(Plane.XZ.offset(1)):
        Rectangle(SKIZZE1_W, SKIZZE1_H)
    extrude(amount=-SCHNITT_LINEAR_AUSTRAGEN1_DEPTH, mode=Mode.SUBTRACT)

    # Skizze2 → Schnitt-Linear austragen2 (cut, through all)
    with BuildSketch(Plane.XZ.offset(1)):
        Rectangle(SKIZZE2_W, SKIZZE2_H)
    extrude(amount=-SCHNITT_LINEAR_AUSTRAGEN2_DEPTH, mode=Mode.SUBTRACT)

    # Skizze3 outside → Schnitt-Linear austragen3 (cut, through all)
    with BuildSketch(Plane.XZ.offset(1)):
        Rectangle(SKIZZE3_OUTSIDE_W, SKIZZE3_OUTSIDE_H)
        with Locations((-10, 0)):
            Rectangle(SKIZZE3_OUTSIDE_W_2, SKIZZE3_OUTSIDE_H_2, mode=Mode.SUBTRACT)
    extrude(amount=-SCHNITT_LINEAR_AUSTRAGEN3_DEPTH, mode=Mode.SUBTRACT)

    # Skizze9 → Schnitt-Linear austragen5 (cut)
    with BuildSketch(Plane.XZ.offset(1)):
        with Locations((-35, 6.5)):
            Rectangle(SKIZZE9_W, SKIZZE9_H)
    extrude(amount=-SCHNITT_LINEAR_AUSTRAGEN5_DEPTH, mode=Mode.SUBTRACT)


solid = part_2.part
